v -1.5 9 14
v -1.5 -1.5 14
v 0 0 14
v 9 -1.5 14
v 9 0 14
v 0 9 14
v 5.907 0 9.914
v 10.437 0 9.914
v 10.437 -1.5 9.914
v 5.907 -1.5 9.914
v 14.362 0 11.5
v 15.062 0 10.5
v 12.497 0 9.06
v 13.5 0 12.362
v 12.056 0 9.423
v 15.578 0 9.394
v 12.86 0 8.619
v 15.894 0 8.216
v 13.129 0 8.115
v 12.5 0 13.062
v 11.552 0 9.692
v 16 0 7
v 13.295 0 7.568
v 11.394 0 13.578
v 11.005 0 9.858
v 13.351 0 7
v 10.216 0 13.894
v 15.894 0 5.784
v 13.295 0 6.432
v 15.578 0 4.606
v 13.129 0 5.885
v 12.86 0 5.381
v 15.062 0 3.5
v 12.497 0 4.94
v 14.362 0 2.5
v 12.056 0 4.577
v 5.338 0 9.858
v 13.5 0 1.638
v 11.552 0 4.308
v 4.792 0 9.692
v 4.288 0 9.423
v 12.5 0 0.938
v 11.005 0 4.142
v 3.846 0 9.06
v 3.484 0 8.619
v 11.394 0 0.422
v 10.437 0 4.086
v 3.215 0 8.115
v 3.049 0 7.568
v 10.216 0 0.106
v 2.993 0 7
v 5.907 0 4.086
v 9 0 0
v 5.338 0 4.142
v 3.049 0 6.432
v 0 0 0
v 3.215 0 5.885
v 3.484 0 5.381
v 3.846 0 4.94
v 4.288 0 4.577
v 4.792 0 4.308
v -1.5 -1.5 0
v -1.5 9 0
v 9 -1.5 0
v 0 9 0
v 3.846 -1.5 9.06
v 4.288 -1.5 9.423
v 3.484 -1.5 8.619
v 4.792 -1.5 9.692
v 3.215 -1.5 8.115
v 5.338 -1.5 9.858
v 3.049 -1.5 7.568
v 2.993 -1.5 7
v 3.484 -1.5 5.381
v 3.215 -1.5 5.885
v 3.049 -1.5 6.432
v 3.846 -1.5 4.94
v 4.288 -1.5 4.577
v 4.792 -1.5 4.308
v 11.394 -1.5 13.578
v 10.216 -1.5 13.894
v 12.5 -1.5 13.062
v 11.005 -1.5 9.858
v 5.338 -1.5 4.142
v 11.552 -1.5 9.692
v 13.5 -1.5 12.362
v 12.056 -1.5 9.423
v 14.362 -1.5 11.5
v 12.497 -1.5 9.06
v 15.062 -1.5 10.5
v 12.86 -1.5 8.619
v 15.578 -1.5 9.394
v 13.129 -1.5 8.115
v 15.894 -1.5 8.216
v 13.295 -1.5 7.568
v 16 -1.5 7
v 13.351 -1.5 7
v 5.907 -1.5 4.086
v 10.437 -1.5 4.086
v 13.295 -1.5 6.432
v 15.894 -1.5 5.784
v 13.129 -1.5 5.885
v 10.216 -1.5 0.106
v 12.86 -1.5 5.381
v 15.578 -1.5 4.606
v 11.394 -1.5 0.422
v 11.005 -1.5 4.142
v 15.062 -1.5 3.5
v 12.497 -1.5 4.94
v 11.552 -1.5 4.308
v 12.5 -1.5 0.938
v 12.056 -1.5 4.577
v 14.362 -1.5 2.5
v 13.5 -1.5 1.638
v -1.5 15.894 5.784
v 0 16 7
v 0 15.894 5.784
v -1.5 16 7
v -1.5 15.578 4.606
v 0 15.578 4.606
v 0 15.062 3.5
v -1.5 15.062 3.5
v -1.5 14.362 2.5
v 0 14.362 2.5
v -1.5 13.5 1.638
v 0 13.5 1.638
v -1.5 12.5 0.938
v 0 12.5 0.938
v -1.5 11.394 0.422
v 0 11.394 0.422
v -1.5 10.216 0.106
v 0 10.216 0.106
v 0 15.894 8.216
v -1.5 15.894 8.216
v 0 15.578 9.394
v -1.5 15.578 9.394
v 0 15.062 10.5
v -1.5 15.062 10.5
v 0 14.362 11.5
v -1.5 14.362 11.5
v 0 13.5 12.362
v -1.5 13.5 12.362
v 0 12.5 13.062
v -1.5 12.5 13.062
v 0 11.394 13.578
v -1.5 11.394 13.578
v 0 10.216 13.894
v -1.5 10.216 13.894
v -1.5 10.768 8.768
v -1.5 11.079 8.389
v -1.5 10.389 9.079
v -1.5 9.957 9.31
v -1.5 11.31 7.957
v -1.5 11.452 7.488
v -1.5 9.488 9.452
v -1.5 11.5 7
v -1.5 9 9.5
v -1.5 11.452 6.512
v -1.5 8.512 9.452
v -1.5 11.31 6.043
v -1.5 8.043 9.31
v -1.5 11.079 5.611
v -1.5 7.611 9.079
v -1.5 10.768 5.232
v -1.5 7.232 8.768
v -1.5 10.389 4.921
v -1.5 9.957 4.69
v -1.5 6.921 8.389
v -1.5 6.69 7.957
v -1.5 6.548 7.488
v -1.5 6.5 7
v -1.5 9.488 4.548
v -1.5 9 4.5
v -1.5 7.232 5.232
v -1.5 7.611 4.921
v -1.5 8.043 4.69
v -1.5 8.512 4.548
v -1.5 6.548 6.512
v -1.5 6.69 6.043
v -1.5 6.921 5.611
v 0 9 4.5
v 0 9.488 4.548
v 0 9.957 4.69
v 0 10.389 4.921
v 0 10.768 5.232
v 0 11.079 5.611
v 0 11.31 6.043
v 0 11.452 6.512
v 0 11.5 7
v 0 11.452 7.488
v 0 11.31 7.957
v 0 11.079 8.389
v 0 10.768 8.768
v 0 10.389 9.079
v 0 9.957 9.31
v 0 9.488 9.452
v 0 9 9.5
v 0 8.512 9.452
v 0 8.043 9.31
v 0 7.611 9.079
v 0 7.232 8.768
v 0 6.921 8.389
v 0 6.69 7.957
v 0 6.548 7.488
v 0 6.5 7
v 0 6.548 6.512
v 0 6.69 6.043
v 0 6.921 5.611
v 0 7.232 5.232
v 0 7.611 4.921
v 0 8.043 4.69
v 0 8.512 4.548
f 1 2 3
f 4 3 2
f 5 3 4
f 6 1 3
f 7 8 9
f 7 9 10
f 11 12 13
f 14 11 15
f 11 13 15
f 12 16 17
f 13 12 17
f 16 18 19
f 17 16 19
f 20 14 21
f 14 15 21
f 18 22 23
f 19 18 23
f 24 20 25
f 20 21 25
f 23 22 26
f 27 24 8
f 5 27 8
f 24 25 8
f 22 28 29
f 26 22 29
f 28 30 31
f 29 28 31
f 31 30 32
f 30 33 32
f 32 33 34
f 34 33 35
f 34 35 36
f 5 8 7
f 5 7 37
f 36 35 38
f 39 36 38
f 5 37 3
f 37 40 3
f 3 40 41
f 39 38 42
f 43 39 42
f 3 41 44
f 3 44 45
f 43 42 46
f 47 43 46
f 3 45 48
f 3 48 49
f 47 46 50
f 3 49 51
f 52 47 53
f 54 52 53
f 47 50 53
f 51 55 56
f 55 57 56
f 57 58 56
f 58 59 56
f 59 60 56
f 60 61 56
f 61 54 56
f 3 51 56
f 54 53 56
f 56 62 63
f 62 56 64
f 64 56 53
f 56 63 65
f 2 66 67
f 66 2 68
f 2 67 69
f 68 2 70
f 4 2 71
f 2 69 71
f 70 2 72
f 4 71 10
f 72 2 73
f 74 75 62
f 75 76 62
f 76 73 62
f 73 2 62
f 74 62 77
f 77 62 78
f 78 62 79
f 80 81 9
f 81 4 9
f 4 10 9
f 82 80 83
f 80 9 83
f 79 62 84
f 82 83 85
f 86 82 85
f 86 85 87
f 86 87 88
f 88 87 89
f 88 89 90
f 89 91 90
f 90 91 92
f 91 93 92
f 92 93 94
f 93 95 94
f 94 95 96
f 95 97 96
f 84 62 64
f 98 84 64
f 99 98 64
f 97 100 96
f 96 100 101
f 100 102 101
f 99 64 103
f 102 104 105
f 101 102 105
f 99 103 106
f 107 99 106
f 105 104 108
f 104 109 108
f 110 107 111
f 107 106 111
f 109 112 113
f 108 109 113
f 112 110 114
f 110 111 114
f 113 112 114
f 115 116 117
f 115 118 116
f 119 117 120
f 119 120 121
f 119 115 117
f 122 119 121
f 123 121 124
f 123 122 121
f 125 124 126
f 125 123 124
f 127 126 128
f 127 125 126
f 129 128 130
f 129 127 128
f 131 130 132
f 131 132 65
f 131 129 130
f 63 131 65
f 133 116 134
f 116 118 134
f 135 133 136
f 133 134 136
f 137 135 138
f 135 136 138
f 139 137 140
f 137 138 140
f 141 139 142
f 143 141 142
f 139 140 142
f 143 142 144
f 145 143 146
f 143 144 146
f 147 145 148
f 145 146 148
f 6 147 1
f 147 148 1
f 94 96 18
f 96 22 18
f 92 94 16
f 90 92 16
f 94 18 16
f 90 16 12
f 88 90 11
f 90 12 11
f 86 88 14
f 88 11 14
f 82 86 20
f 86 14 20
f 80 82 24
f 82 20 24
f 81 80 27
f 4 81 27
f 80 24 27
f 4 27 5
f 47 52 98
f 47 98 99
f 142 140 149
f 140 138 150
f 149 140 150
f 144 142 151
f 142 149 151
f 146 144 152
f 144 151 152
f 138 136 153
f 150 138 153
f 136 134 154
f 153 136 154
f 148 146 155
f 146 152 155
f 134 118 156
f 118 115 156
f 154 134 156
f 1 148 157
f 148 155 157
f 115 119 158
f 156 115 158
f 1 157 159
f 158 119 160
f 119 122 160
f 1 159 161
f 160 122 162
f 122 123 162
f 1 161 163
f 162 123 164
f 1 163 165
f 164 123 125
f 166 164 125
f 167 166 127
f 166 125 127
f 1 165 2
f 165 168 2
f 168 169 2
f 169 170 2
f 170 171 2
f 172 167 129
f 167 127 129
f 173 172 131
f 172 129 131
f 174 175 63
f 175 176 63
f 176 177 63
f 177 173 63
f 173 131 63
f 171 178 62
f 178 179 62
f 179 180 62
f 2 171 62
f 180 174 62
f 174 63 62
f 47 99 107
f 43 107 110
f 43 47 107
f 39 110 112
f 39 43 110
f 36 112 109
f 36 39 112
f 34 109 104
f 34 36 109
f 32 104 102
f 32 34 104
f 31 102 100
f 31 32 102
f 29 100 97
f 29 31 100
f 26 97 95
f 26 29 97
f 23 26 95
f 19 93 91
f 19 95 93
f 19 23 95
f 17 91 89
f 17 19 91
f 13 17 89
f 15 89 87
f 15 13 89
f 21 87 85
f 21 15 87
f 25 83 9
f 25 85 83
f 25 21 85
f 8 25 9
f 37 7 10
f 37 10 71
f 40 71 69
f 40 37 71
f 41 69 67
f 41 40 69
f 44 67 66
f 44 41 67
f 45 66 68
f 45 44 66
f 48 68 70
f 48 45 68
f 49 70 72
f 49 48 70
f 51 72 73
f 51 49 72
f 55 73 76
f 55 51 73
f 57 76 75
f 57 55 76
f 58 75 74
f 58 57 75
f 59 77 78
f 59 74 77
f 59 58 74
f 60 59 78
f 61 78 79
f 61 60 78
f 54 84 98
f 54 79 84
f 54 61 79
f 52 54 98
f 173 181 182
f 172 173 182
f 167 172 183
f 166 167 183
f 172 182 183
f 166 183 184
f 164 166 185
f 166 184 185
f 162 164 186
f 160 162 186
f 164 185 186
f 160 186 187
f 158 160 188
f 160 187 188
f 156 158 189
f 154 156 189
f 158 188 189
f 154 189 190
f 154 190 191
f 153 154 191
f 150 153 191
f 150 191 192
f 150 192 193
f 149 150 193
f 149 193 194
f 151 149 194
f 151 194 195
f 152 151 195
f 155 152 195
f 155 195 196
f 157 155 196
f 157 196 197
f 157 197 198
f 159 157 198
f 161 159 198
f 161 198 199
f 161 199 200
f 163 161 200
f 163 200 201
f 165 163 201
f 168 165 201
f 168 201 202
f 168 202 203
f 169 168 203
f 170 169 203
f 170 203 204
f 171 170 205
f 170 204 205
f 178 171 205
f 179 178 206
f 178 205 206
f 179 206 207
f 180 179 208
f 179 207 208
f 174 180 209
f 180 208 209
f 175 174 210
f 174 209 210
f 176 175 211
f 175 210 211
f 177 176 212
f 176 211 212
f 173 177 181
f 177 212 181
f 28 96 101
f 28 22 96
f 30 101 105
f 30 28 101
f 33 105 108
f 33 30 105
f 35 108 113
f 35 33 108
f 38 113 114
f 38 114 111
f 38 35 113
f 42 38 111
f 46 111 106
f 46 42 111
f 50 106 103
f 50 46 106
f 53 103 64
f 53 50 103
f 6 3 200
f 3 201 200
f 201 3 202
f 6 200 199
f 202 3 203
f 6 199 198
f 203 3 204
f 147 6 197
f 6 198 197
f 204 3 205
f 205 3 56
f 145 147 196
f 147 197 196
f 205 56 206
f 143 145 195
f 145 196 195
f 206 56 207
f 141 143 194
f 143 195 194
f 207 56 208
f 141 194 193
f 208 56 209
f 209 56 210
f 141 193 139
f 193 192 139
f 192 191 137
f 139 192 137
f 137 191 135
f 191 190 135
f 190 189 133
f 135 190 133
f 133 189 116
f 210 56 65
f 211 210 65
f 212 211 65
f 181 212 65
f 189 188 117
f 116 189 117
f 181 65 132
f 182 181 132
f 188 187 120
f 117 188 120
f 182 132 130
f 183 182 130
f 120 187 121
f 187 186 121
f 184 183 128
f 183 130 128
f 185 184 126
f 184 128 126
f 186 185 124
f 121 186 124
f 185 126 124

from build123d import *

# Parameters (mm, degrees)
EXTRUDE_THIN1_DEPTH = 14
FILLET1_R           = 7
CUT_EXTRUDE1_DEPTH  = 27.608269391
SKETCH3_R           = 2.5
CUT_EXTRUDE2_DEPTH  = 27.608269391


with BuildPart() as part:
    # Sketch1 → Extrude-Thin1 (new body)
    with BuildSketch(Plane.XY):
        Polygon((16, 0), (0, 0), (0, 16), (-1.5, 16), (-1.5, -1.5), (16, -1.5), align=None)
    extrude(amount=EXTRUDE_THIN1_DEPTH)

    # Fillet1
    fillet1_edges = [part.edges().sort_by_distance(p)[0] for p in [
        (16, -0.75, 14),
        (16, -0.75, 0),
        (-0.75, 16, 0),
        (-0.75, 16, 14),
    ]]
    fillet(fillet1_edges, radius=FILLET1_R - 0.0001)  # a hair under: the kernel refuses the full size

    # Sketch2 → Cut-Extrude1 (cut, through all)
    with BuildSketch(Plane(origin=(0, 0, 0), x_dir=(1, 0, 0), z_dir=(0, 1, 0))):
        with BuildLine():
            Line((5.90692482, -4.08603122), (10.436644309, -4.08603122))
            ThreePointArc((10.436644309, -4.08603122), (13.350613089, -7), (10.436644309, -9.91396878))
            Line((10.436644309, -9.91396878), (5.90692482, -9.91396878))
            ThreePointArc((5.90692482, -9.91396878), (2.992956041, -7), (5.90692482, -4.08603122))
        make_face()
    extrude(amount=-CUT_EXTRUDE1_DEPTH, mode=Mode.SUBTRACT)

    # Sketch3 → Cut-Extrude2 (cut, through all)
    with BuildSketch(Plane(origin=(0, 0, 0), x_dir=(0, 0, -1), z_dir=(1, 0, 0))):
        with Locations((-7, 9)):
            Circle(SKETCH3_R)
    extrude(amount=-CUT_EXTRUDE2_DEPTH, mode=Mode.SUBTRACT)


solid = part.part
